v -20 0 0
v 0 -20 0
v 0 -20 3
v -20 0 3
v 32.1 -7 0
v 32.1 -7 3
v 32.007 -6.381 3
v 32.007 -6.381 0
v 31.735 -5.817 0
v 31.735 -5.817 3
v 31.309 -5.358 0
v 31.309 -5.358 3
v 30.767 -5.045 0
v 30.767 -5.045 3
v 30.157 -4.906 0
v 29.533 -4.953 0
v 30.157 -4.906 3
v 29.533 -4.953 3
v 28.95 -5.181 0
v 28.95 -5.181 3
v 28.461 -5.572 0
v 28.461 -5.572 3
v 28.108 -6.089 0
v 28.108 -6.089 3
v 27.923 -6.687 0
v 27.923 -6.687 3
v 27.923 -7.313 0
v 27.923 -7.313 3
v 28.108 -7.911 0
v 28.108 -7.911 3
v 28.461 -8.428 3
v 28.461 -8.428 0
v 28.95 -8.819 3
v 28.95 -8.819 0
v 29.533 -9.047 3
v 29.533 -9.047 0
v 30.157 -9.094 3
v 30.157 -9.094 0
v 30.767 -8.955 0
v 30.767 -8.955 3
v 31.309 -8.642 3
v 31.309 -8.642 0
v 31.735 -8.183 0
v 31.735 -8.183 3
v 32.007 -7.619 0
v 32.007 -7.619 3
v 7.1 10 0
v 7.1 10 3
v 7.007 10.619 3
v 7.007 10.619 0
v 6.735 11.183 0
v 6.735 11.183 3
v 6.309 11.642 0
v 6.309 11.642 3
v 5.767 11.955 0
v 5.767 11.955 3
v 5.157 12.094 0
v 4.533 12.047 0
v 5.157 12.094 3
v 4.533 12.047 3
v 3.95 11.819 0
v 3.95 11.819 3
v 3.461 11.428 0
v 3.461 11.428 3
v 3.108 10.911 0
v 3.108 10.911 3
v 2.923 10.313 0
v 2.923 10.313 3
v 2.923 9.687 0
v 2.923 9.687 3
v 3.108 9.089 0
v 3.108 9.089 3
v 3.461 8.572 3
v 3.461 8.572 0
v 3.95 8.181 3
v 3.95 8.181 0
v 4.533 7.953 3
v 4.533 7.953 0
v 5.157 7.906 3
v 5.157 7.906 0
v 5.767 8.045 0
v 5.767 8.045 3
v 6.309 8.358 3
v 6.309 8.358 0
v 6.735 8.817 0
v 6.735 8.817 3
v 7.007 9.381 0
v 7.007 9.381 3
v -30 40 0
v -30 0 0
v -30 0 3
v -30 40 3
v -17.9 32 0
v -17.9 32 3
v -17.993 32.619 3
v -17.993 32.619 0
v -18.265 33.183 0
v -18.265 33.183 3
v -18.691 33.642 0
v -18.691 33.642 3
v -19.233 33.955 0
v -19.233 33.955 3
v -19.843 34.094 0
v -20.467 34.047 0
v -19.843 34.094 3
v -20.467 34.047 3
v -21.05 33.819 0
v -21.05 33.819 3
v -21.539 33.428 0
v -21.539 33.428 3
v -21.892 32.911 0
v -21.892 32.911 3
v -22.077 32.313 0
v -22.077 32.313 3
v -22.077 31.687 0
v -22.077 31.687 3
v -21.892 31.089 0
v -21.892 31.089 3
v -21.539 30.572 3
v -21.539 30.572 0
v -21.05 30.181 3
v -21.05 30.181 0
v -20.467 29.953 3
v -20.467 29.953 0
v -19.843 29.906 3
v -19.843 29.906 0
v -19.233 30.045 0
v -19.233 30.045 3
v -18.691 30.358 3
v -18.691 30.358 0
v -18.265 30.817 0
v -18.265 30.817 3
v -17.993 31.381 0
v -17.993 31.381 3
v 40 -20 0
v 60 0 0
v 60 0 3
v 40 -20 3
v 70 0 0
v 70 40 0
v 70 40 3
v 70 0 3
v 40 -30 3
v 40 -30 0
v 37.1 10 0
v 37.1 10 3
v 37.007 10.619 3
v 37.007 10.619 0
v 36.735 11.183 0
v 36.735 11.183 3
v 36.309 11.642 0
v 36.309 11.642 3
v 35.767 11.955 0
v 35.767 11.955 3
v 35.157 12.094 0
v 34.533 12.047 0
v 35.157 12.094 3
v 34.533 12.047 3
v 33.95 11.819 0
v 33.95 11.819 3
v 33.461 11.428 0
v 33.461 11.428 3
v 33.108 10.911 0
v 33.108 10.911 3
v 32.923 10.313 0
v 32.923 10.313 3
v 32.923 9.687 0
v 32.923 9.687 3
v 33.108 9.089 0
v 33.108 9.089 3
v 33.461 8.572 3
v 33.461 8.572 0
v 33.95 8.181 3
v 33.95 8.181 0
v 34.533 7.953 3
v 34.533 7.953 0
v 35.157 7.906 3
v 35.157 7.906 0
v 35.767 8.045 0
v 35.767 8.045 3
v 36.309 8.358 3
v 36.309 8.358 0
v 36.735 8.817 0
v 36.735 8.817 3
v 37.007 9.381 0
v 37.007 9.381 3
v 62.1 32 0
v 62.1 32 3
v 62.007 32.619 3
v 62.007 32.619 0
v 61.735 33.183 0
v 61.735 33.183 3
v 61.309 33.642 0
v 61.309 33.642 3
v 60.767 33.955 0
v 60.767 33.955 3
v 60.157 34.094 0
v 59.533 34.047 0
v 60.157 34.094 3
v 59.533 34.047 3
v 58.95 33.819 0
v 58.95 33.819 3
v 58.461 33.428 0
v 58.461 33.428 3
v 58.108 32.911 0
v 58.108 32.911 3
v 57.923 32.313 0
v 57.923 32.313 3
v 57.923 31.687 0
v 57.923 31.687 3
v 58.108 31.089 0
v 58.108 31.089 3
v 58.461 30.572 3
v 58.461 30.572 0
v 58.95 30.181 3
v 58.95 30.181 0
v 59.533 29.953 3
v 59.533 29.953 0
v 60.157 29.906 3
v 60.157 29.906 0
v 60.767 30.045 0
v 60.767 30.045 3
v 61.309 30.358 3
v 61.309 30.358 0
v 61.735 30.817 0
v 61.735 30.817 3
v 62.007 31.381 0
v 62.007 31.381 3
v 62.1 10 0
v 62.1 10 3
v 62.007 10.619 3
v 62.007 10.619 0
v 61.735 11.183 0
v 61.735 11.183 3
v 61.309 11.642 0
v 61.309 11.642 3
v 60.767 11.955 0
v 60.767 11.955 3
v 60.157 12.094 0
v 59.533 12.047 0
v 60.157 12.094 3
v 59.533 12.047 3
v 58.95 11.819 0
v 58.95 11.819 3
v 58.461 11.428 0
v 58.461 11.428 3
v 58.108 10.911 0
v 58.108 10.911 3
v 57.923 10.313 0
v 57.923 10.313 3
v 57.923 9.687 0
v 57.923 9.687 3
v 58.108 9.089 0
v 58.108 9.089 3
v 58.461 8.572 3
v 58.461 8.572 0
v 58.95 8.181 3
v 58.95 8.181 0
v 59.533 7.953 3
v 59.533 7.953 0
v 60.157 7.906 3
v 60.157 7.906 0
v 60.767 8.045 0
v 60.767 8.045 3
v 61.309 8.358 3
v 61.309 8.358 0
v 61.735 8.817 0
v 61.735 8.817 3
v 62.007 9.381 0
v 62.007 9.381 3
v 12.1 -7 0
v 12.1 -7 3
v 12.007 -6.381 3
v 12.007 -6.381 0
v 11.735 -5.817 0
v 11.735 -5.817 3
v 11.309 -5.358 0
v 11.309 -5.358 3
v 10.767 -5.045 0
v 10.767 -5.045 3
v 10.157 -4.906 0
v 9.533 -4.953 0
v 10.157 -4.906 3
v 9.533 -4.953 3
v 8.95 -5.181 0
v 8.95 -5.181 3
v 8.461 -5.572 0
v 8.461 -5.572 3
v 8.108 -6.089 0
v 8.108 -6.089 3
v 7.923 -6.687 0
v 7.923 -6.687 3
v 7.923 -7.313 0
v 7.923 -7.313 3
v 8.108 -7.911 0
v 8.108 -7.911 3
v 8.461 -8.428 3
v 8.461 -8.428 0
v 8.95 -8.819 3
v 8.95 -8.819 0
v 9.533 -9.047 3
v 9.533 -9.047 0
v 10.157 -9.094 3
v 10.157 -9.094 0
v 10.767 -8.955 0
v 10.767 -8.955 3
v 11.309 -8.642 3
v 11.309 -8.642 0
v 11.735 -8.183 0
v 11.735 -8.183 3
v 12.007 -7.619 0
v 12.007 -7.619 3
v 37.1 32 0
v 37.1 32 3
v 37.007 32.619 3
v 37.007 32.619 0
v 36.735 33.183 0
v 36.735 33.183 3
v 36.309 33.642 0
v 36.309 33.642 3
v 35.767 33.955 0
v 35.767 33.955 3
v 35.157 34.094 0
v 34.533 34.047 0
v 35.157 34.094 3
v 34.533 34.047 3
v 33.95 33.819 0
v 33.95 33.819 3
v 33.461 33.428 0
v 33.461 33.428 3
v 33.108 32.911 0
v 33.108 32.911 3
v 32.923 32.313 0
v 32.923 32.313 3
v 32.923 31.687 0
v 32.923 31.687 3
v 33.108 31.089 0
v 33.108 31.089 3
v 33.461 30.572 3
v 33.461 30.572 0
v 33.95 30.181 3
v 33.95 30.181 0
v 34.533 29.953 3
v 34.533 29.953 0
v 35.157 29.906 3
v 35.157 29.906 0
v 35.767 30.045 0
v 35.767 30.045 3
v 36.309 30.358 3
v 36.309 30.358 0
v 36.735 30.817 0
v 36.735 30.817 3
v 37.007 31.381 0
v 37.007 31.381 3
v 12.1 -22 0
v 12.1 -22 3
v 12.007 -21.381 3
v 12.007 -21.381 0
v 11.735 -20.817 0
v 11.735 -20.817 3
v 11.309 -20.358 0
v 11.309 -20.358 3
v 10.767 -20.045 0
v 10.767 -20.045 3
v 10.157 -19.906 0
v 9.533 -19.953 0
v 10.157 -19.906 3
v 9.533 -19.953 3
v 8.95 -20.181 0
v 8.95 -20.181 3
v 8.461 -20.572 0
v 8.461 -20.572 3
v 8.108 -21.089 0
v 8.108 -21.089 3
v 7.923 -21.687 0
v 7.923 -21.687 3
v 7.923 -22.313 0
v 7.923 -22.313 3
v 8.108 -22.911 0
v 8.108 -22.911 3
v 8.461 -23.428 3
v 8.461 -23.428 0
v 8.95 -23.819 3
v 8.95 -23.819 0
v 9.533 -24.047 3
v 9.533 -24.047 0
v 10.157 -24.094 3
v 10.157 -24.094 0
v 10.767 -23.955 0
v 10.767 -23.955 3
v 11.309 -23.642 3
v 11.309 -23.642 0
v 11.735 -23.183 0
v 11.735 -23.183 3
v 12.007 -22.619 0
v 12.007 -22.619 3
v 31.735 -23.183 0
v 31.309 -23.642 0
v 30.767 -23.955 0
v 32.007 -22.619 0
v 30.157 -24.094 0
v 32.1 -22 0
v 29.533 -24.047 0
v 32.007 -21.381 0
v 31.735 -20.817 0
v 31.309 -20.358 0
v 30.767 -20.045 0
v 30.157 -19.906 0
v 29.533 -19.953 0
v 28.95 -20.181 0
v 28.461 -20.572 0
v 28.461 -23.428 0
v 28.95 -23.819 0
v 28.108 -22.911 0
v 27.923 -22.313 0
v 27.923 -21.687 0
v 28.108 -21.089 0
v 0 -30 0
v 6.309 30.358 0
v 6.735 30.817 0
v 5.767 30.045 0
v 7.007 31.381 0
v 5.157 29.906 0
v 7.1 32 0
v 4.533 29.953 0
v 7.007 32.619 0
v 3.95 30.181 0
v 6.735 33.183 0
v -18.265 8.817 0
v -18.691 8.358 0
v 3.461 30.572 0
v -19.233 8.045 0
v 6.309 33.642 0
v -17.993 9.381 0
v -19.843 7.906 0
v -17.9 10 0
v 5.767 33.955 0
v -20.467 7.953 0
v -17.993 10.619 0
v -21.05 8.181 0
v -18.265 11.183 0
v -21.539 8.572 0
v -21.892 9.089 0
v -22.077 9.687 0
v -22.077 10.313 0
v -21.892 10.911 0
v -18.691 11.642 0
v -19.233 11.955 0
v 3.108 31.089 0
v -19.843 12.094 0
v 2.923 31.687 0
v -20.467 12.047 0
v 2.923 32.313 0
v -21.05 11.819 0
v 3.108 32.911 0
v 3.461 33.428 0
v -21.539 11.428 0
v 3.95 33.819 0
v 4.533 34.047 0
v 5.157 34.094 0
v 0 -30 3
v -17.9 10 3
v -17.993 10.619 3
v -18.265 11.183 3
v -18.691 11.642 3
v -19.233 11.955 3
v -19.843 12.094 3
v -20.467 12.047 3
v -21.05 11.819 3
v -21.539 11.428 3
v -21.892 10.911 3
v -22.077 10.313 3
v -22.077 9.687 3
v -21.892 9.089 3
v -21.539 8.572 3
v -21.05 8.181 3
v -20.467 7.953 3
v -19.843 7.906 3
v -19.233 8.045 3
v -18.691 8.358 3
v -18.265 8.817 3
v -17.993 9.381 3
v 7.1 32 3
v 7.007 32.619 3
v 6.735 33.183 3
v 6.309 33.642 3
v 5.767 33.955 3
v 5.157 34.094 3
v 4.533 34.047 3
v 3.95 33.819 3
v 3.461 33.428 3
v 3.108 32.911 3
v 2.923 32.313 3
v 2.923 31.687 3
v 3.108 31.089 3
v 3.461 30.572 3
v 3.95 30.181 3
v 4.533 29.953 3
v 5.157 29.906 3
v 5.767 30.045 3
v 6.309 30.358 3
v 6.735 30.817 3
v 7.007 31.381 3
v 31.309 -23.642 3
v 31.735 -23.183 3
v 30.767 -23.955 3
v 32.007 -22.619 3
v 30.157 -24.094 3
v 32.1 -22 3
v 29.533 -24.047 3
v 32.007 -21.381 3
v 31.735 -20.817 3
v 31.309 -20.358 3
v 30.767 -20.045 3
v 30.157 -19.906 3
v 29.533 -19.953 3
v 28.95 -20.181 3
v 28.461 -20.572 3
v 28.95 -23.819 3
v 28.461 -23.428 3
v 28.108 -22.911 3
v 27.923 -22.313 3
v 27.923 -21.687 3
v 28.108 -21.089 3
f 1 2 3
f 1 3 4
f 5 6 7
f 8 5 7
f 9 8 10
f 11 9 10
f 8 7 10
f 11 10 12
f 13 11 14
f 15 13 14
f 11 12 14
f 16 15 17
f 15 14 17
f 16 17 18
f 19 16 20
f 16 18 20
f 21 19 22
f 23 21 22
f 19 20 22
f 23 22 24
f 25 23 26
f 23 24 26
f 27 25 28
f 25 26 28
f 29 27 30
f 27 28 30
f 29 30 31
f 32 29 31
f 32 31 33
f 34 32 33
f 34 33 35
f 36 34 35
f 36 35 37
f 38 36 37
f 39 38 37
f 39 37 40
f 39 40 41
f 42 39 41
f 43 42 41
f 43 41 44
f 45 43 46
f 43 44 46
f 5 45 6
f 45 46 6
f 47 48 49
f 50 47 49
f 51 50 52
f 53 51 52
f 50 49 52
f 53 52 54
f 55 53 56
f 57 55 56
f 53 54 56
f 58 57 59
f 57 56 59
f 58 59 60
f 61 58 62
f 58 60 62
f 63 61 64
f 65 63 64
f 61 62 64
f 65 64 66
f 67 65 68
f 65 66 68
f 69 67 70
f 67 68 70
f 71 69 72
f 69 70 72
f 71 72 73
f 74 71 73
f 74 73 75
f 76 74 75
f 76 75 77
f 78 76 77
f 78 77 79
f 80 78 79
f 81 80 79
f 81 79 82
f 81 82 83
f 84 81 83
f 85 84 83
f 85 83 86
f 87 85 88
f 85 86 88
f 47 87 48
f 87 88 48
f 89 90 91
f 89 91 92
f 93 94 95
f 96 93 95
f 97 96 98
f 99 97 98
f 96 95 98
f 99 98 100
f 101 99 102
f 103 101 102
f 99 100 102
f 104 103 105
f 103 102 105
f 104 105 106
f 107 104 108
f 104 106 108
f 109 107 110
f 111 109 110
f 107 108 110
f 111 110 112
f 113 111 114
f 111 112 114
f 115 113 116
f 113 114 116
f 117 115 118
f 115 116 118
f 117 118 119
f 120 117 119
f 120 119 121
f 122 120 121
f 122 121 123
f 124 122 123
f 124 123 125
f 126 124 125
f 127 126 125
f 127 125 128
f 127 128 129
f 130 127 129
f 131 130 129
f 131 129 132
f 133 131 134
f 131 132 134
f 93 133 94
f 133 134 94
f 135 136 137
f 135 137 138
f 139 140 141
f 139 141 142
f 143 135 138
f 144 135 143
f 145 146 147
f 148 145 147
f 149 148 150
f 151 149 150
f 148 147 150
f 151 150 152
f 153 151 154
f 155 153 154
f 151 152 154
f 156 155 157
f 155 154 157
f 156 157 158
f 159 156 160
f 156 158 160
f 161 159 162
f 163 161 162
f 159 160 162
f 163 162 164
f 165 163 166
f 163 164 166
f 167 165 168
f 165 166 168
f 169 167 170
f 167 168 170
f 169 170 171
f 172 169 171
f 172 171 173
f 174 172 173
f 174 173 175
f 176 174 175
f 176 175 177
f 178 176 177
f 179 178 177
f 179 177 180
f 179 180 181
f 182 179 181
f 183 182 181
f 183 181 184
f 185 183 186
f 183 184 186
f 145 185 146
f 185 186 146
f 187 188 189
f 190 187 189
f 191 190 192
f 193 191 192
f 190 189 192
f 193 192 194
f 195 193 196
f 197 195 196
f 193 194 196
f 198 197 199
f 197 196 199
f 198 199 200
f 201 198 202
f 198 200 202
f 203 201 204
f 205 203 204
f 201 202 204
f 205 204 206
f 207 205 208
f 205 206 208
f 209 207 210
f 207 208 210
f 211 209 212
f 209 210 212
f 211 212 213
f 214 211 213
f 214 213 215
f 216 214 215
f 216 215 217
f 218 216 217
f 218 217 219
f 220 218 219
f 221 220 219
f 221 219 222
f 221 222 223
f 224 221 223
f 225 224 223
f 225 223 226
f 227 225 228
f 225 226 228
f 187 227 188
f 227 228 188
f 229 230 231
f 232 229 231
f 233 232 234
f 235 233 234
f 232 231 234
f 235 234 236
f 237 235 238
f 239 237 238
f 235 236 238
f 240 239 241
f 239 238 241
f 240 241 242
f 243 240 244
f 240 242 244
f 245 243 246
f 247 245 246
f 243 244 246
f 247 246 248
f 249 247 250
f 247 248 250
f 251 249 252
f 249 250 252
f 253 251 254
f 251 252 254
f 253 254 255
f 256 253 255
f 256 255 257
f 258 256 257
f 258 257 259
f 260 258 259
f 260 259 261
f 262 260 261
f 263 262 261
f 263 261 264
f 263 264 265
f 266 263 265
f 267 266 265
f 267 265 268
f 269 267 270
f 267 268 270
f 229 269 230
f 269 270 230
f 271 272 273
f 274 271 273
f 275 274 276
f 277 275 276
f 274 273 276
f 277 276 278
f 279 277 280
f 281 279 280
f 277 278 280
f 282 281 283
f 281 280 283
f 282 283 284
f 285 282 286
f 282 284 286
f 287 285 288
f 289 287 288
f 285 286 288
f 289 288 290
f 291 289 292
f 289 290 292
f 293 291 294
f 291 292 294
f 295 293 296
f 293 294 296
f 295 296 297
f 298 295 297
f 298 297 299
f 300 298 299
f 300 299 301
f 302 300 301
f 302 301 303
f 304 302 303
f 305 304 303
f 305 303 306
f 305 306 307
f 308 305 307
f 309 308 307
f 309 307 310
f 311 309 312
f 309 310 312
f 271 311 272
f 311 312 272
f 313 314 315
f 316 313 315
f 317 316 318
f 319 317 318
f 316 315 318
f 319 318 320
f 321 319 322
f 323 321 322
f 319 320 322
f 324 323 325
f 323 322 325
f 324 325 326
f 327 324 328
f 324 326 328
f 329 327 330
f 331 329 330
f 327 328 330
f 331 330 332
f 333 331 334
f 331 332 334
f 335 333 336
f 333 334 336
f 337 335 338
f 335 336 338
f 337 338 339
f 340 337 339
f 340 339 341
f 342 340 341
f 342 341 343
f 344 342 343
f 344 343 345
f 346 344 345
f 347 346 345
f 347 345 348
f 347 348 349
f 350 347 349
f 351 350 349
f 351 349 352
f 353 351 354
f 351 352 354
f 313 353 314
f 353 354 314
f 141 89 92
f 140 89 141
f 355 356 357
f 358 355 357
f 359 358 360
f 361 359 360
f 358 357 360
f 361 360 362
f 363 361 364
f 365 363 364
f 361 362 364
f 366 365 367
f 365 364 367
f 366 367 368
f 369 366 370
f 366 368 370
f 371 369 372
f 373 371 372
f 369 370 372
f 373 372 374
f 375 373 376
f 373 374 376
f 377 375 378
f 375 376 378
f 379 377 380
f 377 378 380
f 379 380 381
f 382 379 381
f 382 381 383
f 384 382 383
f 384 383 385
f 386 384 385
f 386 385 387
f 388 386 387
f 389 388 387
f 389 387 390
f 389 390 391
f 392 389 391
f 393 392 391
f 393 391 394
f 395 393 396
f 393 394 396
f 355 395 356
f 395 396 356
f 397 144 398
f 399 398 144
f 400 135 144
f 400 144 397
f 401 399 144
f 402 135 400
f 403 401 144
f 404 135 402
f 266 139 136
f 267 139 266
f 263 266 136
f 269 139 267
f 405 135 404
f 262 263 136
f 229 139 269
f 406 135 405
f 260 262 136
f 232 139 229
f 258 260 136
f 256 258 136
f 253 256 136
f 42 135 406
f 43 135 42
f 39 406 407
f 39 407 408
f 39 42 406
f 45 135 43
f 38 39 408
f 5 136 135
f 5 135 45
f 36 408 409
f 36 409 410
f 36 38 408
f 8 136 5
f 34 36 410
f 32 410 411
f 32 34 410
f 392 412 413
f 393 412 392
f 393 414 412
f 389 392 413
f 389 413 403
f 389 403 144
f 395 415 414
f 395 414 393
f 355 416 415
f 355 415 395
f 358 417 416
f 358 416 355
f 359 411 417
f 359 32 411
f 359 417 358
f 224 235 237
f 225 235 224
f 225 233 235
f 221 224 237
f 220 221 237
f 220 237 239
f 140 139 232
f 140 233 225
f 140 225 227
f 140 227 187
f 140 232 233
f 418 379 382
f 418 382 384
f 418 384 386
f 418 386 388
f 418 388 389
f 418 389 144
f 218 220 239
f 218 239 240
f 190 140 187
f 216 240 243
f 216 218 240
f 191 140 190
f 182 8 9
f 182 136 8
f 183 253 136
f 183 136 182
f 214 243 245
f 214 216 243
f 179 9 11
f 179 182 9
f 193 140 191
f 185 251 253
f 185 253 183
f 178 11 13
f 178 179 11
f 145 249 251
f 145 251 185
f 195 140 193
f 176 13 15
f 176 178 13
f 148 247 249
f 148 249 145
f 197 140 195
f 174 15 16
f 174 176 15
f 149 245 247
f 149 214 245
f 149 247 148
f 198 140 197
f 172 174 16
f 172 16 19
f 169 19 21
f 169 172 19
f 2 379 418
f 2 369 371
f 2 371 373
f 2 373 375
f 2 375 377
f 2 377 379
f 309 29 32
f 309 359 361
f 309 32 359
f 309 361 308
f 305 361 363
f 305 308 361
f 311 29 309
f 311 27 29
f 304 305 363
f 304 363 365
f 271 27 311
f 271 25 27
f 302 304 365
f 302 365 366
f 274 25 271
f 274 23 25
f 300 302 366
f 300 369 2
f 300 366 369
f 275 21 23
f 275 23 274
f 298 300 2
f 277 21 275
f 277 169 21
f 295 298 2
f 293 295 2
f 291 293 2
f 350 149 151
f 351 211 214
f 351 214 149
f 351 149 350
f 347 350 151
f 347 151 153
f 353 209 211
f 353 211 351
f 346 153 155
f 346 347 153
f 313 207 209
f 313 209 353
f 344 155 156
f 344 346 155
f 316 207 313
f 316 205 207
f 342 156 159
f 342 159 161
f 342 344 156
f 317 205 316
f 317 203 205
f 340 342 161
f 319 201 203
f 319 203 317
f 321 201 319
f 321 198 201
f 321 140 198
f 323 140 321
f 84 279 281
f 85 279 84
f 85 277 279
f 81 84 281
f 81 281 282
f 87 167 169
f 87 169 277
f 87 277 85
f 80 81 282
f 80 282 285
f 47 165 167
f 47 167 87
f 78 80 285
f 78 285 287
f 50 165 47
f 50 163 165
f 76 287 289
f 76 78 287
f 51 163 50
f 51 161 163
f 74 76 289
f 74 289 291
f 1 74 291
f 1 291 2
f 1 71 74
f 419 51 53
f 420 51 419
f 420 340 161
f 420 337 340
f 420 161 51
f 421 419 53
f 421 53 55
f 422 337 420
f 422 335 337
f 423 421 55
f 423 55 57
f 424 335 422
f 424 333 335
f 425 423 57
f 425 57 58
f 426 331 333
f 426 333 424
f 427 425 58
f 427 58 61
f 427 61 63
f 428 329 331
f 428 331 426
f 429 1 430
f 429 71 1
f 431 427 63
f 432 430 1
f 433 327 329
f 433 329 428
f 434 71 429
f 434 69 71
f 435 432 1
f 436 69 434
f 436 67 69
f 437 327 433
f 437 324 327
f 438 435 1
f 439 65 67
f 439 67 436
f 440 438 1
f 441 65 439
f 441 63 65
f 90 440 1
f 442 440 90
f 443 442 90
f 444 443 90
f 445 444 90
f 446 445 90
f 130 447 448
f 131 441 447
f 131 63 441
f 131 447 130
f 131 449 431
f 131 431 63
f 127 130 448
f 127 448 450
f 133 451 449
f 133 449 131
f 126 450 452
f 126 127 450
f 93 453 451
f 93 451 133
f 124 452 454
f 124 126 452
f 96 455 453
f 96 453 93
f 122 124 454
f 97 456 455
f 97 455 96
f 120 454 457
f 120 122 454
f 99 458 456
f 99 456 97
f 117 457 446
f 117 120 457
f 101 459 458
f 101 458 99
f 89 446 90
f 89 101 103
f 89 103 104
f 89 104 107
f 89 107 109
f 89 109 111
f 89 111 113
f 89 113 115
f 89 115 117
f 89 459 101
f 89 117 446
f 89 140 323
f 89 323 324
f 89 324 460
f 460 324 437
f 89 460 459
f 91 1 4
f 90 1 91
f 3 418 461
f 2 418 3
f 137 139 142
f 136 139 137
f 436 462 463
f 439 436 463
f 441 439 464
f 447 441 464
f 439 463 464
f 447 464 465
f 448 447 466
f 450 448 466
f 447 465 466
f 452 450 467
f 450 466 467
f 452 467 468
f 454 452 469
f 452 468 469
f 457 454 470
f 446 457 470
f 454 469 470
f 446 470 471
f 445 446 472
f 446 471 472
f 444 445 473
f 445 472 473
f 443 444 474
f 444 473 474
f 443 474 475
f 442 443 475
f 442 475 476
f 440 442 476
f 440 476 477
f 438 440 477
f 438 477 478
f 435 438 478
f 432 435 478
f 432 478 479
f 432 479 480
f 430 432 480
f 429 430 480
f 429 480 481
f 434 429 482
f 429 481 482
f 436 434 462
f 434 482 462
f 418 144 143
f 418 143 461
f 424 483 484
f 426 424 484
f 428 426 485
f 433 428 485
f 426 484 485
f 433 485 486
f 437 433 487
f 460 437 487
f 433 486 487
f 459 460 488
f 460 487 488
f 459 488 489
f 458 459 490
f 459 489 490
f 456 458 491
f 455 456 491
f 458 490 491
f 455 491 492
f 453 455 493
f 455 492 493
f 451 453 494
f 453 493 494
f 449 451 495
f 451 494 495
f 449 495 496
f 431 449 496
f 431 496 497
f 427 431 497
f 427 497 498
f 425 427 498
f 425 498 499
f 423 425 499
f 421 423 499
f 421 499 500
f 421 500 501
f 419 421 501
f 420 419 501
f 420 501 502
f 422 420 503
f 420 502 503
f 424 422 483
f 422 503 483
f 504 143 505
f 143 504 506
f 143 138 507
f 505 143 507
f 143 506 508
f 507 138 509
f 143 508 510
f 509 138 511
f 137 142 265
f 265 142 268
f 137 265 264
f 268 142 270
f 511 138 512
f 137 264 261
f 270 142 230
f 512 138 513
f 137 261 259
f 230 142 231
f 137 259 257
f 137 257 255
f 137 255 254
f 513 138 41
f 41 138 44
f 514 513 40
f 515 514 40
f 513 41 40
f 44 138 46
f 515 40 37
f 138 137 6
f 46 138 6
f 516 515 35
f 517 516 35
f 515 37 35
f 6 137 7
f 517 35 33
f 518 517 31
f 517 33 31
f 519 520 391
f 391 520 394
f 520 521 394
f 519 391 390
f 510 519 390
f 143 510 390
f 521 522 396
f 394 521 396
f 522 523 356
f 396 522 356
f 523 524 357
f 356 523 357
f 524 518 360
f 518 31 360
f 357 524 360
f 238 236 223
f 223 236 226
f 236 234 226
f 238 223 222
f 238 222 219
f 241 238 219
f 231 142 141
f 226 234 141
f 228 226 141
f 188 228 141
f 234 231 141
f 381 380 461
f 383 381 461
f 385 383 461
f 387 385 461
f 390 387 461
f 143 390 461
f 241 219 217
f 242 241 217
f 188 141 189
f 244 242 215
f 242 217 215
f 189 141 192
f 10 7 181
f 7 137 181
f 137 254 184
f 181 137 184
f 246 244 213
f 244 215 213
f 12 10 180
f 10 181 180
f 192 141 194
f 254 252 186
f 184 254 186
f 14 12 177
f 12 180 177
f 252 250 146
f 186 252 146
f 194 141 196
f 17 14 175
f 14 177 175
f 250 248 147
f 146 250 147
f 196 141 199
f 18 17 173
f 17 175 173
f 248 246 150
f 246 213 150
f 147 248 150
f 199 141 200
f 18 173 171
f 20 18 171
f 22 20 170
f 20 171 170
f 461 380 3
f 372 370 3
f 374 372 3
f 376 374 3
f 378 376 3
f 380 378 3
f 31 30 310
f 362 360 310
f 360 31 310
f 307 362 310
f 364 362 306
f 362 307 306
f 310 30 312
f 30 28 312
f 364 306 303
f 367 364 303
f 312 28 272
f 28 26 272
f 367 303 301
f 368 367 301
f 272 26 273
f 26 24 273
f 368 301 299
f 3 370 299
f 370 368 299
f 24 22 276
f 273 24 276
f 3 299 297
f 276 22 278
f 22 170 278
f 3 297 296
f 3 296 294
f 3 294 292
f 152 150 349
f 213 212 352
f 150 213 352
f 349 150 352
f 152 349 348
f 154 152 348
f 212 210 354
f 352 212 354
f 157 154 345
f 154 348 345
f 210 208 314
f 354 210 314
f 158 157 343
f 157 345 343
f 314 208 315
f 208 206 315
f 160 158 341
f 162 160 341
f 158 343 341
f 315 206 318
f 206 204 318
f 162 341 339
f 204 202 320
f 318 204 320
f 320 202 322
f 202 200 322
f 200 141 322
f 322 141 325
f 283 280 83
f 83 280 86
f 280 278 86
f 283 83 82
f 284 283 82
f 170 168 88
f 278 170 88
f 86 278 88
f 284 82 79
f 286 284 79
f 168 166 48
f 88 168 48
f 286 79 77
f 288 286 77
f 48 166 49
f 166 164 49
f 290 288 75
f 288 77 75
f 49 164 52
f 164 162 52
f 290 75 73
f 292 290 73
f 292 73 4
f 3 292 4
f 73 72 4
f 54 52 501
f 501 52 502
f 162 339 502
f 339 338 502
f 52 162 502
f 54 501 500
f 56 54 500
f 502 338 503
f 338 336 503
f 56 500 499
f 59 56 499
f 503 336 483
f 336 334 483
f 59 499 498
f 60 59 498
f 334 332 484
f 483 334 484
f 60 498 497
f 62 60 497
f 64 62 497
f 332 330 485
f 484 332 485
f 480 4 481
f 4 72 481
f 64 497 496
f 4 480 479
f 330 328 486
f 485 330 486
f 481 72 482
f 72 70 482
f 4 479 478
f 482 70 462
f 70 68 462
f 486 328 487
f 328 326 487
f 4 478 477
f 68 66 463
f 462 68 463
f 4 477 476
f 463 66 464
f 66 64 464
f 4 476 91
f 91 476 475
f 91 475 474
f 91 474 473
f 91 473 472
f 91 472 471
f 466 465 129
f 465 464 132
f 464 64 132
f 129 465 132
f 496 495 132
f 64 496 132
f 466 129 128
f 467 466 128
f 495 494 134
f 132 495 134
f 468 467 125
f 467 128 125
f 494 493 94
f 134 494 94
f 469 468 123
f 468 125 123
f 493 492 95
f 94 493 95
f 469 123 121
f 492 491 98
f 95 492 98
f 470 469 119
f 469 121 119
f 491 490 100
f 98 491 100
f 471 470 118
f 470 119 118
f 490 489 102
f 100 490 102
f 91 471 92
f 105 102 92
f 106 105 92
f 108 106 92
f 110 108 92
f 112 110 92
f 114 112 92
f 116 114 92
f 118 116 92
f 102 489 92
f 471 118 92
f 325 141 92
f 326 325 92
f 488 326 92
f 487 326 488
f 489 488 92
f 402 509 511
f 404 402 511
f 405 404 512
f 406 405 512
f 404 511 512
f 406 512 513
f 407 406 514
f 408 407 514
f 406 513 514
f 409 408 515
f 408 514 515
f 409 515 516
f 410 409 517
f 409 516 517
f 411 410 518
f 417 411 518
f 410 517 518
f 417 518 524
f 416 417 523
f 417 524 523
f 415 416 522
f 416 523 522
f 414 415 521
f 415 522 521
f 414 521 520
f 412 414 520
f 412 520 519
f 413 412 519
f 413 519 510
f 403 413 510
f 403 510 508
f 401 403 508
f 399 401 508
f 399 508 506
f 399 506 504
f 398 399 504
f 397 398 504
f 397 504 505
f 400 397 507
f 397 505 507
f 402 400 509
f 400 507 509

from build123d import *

# Parameters (mm, degrees)
EXTRUDE_1_DEPTH     = 3
SKETCH_2_R          = 2.1
CUT_EXTRUDE_1_DEPTH = 3


with BuildPart() as part:
    # 草图1 → 凸台-拉伸1 (new body)
    with BuildSketch(Plane.XY):
        Polygon((-20, 0), (-30, 0), (-30, 40), (70, 40), (70, 0), (60, 0), (40, -20), (40, -30), (0, -30), (0, -20), align=None)
    extrude(amount=EXTRUDE_1_DEPTH)

    # 草图2 → 切除-拉伸1 (cut)
    with BuildSketch(Plane.XY.offset(3)):
        with Locations((10, -7)):
            Circle(SKETCH_2_R)
        with Locations((30, -7)):
            Circle(SKETCH_2_R)
        with Locations((10, -22)):
            Circle(SKETCH_2_R)
        with Locations((30, -22)):
            Circle(SKETCH_2_R)
        with Locations((-20, 10)):
            Circle(SKETCH_2_R)
        with Locations((-20, 32)):
            Circle(SKETCH_2_R)
        with Locations((5, 10)):
            Circle(SKETCH_2_R)
        with Locations((35, 10)):
            Circle(SKETCH_2_R)
        with Locations((60, 10)):
            Circle(SKETCH_2_R)
        with Locations((60, 32)):
            Circle(SKETCH_2_R)
        with Locations((35, 32)):
            Circle(SKETCH_2_R)
        with Locations((5, 32)):
            Circle(SKETCH_2_R)
    extrude(amount=-CUT_EXTRUDE_1_DEPTH, mode=Mode.SUBTRACT)


solid = part.part
